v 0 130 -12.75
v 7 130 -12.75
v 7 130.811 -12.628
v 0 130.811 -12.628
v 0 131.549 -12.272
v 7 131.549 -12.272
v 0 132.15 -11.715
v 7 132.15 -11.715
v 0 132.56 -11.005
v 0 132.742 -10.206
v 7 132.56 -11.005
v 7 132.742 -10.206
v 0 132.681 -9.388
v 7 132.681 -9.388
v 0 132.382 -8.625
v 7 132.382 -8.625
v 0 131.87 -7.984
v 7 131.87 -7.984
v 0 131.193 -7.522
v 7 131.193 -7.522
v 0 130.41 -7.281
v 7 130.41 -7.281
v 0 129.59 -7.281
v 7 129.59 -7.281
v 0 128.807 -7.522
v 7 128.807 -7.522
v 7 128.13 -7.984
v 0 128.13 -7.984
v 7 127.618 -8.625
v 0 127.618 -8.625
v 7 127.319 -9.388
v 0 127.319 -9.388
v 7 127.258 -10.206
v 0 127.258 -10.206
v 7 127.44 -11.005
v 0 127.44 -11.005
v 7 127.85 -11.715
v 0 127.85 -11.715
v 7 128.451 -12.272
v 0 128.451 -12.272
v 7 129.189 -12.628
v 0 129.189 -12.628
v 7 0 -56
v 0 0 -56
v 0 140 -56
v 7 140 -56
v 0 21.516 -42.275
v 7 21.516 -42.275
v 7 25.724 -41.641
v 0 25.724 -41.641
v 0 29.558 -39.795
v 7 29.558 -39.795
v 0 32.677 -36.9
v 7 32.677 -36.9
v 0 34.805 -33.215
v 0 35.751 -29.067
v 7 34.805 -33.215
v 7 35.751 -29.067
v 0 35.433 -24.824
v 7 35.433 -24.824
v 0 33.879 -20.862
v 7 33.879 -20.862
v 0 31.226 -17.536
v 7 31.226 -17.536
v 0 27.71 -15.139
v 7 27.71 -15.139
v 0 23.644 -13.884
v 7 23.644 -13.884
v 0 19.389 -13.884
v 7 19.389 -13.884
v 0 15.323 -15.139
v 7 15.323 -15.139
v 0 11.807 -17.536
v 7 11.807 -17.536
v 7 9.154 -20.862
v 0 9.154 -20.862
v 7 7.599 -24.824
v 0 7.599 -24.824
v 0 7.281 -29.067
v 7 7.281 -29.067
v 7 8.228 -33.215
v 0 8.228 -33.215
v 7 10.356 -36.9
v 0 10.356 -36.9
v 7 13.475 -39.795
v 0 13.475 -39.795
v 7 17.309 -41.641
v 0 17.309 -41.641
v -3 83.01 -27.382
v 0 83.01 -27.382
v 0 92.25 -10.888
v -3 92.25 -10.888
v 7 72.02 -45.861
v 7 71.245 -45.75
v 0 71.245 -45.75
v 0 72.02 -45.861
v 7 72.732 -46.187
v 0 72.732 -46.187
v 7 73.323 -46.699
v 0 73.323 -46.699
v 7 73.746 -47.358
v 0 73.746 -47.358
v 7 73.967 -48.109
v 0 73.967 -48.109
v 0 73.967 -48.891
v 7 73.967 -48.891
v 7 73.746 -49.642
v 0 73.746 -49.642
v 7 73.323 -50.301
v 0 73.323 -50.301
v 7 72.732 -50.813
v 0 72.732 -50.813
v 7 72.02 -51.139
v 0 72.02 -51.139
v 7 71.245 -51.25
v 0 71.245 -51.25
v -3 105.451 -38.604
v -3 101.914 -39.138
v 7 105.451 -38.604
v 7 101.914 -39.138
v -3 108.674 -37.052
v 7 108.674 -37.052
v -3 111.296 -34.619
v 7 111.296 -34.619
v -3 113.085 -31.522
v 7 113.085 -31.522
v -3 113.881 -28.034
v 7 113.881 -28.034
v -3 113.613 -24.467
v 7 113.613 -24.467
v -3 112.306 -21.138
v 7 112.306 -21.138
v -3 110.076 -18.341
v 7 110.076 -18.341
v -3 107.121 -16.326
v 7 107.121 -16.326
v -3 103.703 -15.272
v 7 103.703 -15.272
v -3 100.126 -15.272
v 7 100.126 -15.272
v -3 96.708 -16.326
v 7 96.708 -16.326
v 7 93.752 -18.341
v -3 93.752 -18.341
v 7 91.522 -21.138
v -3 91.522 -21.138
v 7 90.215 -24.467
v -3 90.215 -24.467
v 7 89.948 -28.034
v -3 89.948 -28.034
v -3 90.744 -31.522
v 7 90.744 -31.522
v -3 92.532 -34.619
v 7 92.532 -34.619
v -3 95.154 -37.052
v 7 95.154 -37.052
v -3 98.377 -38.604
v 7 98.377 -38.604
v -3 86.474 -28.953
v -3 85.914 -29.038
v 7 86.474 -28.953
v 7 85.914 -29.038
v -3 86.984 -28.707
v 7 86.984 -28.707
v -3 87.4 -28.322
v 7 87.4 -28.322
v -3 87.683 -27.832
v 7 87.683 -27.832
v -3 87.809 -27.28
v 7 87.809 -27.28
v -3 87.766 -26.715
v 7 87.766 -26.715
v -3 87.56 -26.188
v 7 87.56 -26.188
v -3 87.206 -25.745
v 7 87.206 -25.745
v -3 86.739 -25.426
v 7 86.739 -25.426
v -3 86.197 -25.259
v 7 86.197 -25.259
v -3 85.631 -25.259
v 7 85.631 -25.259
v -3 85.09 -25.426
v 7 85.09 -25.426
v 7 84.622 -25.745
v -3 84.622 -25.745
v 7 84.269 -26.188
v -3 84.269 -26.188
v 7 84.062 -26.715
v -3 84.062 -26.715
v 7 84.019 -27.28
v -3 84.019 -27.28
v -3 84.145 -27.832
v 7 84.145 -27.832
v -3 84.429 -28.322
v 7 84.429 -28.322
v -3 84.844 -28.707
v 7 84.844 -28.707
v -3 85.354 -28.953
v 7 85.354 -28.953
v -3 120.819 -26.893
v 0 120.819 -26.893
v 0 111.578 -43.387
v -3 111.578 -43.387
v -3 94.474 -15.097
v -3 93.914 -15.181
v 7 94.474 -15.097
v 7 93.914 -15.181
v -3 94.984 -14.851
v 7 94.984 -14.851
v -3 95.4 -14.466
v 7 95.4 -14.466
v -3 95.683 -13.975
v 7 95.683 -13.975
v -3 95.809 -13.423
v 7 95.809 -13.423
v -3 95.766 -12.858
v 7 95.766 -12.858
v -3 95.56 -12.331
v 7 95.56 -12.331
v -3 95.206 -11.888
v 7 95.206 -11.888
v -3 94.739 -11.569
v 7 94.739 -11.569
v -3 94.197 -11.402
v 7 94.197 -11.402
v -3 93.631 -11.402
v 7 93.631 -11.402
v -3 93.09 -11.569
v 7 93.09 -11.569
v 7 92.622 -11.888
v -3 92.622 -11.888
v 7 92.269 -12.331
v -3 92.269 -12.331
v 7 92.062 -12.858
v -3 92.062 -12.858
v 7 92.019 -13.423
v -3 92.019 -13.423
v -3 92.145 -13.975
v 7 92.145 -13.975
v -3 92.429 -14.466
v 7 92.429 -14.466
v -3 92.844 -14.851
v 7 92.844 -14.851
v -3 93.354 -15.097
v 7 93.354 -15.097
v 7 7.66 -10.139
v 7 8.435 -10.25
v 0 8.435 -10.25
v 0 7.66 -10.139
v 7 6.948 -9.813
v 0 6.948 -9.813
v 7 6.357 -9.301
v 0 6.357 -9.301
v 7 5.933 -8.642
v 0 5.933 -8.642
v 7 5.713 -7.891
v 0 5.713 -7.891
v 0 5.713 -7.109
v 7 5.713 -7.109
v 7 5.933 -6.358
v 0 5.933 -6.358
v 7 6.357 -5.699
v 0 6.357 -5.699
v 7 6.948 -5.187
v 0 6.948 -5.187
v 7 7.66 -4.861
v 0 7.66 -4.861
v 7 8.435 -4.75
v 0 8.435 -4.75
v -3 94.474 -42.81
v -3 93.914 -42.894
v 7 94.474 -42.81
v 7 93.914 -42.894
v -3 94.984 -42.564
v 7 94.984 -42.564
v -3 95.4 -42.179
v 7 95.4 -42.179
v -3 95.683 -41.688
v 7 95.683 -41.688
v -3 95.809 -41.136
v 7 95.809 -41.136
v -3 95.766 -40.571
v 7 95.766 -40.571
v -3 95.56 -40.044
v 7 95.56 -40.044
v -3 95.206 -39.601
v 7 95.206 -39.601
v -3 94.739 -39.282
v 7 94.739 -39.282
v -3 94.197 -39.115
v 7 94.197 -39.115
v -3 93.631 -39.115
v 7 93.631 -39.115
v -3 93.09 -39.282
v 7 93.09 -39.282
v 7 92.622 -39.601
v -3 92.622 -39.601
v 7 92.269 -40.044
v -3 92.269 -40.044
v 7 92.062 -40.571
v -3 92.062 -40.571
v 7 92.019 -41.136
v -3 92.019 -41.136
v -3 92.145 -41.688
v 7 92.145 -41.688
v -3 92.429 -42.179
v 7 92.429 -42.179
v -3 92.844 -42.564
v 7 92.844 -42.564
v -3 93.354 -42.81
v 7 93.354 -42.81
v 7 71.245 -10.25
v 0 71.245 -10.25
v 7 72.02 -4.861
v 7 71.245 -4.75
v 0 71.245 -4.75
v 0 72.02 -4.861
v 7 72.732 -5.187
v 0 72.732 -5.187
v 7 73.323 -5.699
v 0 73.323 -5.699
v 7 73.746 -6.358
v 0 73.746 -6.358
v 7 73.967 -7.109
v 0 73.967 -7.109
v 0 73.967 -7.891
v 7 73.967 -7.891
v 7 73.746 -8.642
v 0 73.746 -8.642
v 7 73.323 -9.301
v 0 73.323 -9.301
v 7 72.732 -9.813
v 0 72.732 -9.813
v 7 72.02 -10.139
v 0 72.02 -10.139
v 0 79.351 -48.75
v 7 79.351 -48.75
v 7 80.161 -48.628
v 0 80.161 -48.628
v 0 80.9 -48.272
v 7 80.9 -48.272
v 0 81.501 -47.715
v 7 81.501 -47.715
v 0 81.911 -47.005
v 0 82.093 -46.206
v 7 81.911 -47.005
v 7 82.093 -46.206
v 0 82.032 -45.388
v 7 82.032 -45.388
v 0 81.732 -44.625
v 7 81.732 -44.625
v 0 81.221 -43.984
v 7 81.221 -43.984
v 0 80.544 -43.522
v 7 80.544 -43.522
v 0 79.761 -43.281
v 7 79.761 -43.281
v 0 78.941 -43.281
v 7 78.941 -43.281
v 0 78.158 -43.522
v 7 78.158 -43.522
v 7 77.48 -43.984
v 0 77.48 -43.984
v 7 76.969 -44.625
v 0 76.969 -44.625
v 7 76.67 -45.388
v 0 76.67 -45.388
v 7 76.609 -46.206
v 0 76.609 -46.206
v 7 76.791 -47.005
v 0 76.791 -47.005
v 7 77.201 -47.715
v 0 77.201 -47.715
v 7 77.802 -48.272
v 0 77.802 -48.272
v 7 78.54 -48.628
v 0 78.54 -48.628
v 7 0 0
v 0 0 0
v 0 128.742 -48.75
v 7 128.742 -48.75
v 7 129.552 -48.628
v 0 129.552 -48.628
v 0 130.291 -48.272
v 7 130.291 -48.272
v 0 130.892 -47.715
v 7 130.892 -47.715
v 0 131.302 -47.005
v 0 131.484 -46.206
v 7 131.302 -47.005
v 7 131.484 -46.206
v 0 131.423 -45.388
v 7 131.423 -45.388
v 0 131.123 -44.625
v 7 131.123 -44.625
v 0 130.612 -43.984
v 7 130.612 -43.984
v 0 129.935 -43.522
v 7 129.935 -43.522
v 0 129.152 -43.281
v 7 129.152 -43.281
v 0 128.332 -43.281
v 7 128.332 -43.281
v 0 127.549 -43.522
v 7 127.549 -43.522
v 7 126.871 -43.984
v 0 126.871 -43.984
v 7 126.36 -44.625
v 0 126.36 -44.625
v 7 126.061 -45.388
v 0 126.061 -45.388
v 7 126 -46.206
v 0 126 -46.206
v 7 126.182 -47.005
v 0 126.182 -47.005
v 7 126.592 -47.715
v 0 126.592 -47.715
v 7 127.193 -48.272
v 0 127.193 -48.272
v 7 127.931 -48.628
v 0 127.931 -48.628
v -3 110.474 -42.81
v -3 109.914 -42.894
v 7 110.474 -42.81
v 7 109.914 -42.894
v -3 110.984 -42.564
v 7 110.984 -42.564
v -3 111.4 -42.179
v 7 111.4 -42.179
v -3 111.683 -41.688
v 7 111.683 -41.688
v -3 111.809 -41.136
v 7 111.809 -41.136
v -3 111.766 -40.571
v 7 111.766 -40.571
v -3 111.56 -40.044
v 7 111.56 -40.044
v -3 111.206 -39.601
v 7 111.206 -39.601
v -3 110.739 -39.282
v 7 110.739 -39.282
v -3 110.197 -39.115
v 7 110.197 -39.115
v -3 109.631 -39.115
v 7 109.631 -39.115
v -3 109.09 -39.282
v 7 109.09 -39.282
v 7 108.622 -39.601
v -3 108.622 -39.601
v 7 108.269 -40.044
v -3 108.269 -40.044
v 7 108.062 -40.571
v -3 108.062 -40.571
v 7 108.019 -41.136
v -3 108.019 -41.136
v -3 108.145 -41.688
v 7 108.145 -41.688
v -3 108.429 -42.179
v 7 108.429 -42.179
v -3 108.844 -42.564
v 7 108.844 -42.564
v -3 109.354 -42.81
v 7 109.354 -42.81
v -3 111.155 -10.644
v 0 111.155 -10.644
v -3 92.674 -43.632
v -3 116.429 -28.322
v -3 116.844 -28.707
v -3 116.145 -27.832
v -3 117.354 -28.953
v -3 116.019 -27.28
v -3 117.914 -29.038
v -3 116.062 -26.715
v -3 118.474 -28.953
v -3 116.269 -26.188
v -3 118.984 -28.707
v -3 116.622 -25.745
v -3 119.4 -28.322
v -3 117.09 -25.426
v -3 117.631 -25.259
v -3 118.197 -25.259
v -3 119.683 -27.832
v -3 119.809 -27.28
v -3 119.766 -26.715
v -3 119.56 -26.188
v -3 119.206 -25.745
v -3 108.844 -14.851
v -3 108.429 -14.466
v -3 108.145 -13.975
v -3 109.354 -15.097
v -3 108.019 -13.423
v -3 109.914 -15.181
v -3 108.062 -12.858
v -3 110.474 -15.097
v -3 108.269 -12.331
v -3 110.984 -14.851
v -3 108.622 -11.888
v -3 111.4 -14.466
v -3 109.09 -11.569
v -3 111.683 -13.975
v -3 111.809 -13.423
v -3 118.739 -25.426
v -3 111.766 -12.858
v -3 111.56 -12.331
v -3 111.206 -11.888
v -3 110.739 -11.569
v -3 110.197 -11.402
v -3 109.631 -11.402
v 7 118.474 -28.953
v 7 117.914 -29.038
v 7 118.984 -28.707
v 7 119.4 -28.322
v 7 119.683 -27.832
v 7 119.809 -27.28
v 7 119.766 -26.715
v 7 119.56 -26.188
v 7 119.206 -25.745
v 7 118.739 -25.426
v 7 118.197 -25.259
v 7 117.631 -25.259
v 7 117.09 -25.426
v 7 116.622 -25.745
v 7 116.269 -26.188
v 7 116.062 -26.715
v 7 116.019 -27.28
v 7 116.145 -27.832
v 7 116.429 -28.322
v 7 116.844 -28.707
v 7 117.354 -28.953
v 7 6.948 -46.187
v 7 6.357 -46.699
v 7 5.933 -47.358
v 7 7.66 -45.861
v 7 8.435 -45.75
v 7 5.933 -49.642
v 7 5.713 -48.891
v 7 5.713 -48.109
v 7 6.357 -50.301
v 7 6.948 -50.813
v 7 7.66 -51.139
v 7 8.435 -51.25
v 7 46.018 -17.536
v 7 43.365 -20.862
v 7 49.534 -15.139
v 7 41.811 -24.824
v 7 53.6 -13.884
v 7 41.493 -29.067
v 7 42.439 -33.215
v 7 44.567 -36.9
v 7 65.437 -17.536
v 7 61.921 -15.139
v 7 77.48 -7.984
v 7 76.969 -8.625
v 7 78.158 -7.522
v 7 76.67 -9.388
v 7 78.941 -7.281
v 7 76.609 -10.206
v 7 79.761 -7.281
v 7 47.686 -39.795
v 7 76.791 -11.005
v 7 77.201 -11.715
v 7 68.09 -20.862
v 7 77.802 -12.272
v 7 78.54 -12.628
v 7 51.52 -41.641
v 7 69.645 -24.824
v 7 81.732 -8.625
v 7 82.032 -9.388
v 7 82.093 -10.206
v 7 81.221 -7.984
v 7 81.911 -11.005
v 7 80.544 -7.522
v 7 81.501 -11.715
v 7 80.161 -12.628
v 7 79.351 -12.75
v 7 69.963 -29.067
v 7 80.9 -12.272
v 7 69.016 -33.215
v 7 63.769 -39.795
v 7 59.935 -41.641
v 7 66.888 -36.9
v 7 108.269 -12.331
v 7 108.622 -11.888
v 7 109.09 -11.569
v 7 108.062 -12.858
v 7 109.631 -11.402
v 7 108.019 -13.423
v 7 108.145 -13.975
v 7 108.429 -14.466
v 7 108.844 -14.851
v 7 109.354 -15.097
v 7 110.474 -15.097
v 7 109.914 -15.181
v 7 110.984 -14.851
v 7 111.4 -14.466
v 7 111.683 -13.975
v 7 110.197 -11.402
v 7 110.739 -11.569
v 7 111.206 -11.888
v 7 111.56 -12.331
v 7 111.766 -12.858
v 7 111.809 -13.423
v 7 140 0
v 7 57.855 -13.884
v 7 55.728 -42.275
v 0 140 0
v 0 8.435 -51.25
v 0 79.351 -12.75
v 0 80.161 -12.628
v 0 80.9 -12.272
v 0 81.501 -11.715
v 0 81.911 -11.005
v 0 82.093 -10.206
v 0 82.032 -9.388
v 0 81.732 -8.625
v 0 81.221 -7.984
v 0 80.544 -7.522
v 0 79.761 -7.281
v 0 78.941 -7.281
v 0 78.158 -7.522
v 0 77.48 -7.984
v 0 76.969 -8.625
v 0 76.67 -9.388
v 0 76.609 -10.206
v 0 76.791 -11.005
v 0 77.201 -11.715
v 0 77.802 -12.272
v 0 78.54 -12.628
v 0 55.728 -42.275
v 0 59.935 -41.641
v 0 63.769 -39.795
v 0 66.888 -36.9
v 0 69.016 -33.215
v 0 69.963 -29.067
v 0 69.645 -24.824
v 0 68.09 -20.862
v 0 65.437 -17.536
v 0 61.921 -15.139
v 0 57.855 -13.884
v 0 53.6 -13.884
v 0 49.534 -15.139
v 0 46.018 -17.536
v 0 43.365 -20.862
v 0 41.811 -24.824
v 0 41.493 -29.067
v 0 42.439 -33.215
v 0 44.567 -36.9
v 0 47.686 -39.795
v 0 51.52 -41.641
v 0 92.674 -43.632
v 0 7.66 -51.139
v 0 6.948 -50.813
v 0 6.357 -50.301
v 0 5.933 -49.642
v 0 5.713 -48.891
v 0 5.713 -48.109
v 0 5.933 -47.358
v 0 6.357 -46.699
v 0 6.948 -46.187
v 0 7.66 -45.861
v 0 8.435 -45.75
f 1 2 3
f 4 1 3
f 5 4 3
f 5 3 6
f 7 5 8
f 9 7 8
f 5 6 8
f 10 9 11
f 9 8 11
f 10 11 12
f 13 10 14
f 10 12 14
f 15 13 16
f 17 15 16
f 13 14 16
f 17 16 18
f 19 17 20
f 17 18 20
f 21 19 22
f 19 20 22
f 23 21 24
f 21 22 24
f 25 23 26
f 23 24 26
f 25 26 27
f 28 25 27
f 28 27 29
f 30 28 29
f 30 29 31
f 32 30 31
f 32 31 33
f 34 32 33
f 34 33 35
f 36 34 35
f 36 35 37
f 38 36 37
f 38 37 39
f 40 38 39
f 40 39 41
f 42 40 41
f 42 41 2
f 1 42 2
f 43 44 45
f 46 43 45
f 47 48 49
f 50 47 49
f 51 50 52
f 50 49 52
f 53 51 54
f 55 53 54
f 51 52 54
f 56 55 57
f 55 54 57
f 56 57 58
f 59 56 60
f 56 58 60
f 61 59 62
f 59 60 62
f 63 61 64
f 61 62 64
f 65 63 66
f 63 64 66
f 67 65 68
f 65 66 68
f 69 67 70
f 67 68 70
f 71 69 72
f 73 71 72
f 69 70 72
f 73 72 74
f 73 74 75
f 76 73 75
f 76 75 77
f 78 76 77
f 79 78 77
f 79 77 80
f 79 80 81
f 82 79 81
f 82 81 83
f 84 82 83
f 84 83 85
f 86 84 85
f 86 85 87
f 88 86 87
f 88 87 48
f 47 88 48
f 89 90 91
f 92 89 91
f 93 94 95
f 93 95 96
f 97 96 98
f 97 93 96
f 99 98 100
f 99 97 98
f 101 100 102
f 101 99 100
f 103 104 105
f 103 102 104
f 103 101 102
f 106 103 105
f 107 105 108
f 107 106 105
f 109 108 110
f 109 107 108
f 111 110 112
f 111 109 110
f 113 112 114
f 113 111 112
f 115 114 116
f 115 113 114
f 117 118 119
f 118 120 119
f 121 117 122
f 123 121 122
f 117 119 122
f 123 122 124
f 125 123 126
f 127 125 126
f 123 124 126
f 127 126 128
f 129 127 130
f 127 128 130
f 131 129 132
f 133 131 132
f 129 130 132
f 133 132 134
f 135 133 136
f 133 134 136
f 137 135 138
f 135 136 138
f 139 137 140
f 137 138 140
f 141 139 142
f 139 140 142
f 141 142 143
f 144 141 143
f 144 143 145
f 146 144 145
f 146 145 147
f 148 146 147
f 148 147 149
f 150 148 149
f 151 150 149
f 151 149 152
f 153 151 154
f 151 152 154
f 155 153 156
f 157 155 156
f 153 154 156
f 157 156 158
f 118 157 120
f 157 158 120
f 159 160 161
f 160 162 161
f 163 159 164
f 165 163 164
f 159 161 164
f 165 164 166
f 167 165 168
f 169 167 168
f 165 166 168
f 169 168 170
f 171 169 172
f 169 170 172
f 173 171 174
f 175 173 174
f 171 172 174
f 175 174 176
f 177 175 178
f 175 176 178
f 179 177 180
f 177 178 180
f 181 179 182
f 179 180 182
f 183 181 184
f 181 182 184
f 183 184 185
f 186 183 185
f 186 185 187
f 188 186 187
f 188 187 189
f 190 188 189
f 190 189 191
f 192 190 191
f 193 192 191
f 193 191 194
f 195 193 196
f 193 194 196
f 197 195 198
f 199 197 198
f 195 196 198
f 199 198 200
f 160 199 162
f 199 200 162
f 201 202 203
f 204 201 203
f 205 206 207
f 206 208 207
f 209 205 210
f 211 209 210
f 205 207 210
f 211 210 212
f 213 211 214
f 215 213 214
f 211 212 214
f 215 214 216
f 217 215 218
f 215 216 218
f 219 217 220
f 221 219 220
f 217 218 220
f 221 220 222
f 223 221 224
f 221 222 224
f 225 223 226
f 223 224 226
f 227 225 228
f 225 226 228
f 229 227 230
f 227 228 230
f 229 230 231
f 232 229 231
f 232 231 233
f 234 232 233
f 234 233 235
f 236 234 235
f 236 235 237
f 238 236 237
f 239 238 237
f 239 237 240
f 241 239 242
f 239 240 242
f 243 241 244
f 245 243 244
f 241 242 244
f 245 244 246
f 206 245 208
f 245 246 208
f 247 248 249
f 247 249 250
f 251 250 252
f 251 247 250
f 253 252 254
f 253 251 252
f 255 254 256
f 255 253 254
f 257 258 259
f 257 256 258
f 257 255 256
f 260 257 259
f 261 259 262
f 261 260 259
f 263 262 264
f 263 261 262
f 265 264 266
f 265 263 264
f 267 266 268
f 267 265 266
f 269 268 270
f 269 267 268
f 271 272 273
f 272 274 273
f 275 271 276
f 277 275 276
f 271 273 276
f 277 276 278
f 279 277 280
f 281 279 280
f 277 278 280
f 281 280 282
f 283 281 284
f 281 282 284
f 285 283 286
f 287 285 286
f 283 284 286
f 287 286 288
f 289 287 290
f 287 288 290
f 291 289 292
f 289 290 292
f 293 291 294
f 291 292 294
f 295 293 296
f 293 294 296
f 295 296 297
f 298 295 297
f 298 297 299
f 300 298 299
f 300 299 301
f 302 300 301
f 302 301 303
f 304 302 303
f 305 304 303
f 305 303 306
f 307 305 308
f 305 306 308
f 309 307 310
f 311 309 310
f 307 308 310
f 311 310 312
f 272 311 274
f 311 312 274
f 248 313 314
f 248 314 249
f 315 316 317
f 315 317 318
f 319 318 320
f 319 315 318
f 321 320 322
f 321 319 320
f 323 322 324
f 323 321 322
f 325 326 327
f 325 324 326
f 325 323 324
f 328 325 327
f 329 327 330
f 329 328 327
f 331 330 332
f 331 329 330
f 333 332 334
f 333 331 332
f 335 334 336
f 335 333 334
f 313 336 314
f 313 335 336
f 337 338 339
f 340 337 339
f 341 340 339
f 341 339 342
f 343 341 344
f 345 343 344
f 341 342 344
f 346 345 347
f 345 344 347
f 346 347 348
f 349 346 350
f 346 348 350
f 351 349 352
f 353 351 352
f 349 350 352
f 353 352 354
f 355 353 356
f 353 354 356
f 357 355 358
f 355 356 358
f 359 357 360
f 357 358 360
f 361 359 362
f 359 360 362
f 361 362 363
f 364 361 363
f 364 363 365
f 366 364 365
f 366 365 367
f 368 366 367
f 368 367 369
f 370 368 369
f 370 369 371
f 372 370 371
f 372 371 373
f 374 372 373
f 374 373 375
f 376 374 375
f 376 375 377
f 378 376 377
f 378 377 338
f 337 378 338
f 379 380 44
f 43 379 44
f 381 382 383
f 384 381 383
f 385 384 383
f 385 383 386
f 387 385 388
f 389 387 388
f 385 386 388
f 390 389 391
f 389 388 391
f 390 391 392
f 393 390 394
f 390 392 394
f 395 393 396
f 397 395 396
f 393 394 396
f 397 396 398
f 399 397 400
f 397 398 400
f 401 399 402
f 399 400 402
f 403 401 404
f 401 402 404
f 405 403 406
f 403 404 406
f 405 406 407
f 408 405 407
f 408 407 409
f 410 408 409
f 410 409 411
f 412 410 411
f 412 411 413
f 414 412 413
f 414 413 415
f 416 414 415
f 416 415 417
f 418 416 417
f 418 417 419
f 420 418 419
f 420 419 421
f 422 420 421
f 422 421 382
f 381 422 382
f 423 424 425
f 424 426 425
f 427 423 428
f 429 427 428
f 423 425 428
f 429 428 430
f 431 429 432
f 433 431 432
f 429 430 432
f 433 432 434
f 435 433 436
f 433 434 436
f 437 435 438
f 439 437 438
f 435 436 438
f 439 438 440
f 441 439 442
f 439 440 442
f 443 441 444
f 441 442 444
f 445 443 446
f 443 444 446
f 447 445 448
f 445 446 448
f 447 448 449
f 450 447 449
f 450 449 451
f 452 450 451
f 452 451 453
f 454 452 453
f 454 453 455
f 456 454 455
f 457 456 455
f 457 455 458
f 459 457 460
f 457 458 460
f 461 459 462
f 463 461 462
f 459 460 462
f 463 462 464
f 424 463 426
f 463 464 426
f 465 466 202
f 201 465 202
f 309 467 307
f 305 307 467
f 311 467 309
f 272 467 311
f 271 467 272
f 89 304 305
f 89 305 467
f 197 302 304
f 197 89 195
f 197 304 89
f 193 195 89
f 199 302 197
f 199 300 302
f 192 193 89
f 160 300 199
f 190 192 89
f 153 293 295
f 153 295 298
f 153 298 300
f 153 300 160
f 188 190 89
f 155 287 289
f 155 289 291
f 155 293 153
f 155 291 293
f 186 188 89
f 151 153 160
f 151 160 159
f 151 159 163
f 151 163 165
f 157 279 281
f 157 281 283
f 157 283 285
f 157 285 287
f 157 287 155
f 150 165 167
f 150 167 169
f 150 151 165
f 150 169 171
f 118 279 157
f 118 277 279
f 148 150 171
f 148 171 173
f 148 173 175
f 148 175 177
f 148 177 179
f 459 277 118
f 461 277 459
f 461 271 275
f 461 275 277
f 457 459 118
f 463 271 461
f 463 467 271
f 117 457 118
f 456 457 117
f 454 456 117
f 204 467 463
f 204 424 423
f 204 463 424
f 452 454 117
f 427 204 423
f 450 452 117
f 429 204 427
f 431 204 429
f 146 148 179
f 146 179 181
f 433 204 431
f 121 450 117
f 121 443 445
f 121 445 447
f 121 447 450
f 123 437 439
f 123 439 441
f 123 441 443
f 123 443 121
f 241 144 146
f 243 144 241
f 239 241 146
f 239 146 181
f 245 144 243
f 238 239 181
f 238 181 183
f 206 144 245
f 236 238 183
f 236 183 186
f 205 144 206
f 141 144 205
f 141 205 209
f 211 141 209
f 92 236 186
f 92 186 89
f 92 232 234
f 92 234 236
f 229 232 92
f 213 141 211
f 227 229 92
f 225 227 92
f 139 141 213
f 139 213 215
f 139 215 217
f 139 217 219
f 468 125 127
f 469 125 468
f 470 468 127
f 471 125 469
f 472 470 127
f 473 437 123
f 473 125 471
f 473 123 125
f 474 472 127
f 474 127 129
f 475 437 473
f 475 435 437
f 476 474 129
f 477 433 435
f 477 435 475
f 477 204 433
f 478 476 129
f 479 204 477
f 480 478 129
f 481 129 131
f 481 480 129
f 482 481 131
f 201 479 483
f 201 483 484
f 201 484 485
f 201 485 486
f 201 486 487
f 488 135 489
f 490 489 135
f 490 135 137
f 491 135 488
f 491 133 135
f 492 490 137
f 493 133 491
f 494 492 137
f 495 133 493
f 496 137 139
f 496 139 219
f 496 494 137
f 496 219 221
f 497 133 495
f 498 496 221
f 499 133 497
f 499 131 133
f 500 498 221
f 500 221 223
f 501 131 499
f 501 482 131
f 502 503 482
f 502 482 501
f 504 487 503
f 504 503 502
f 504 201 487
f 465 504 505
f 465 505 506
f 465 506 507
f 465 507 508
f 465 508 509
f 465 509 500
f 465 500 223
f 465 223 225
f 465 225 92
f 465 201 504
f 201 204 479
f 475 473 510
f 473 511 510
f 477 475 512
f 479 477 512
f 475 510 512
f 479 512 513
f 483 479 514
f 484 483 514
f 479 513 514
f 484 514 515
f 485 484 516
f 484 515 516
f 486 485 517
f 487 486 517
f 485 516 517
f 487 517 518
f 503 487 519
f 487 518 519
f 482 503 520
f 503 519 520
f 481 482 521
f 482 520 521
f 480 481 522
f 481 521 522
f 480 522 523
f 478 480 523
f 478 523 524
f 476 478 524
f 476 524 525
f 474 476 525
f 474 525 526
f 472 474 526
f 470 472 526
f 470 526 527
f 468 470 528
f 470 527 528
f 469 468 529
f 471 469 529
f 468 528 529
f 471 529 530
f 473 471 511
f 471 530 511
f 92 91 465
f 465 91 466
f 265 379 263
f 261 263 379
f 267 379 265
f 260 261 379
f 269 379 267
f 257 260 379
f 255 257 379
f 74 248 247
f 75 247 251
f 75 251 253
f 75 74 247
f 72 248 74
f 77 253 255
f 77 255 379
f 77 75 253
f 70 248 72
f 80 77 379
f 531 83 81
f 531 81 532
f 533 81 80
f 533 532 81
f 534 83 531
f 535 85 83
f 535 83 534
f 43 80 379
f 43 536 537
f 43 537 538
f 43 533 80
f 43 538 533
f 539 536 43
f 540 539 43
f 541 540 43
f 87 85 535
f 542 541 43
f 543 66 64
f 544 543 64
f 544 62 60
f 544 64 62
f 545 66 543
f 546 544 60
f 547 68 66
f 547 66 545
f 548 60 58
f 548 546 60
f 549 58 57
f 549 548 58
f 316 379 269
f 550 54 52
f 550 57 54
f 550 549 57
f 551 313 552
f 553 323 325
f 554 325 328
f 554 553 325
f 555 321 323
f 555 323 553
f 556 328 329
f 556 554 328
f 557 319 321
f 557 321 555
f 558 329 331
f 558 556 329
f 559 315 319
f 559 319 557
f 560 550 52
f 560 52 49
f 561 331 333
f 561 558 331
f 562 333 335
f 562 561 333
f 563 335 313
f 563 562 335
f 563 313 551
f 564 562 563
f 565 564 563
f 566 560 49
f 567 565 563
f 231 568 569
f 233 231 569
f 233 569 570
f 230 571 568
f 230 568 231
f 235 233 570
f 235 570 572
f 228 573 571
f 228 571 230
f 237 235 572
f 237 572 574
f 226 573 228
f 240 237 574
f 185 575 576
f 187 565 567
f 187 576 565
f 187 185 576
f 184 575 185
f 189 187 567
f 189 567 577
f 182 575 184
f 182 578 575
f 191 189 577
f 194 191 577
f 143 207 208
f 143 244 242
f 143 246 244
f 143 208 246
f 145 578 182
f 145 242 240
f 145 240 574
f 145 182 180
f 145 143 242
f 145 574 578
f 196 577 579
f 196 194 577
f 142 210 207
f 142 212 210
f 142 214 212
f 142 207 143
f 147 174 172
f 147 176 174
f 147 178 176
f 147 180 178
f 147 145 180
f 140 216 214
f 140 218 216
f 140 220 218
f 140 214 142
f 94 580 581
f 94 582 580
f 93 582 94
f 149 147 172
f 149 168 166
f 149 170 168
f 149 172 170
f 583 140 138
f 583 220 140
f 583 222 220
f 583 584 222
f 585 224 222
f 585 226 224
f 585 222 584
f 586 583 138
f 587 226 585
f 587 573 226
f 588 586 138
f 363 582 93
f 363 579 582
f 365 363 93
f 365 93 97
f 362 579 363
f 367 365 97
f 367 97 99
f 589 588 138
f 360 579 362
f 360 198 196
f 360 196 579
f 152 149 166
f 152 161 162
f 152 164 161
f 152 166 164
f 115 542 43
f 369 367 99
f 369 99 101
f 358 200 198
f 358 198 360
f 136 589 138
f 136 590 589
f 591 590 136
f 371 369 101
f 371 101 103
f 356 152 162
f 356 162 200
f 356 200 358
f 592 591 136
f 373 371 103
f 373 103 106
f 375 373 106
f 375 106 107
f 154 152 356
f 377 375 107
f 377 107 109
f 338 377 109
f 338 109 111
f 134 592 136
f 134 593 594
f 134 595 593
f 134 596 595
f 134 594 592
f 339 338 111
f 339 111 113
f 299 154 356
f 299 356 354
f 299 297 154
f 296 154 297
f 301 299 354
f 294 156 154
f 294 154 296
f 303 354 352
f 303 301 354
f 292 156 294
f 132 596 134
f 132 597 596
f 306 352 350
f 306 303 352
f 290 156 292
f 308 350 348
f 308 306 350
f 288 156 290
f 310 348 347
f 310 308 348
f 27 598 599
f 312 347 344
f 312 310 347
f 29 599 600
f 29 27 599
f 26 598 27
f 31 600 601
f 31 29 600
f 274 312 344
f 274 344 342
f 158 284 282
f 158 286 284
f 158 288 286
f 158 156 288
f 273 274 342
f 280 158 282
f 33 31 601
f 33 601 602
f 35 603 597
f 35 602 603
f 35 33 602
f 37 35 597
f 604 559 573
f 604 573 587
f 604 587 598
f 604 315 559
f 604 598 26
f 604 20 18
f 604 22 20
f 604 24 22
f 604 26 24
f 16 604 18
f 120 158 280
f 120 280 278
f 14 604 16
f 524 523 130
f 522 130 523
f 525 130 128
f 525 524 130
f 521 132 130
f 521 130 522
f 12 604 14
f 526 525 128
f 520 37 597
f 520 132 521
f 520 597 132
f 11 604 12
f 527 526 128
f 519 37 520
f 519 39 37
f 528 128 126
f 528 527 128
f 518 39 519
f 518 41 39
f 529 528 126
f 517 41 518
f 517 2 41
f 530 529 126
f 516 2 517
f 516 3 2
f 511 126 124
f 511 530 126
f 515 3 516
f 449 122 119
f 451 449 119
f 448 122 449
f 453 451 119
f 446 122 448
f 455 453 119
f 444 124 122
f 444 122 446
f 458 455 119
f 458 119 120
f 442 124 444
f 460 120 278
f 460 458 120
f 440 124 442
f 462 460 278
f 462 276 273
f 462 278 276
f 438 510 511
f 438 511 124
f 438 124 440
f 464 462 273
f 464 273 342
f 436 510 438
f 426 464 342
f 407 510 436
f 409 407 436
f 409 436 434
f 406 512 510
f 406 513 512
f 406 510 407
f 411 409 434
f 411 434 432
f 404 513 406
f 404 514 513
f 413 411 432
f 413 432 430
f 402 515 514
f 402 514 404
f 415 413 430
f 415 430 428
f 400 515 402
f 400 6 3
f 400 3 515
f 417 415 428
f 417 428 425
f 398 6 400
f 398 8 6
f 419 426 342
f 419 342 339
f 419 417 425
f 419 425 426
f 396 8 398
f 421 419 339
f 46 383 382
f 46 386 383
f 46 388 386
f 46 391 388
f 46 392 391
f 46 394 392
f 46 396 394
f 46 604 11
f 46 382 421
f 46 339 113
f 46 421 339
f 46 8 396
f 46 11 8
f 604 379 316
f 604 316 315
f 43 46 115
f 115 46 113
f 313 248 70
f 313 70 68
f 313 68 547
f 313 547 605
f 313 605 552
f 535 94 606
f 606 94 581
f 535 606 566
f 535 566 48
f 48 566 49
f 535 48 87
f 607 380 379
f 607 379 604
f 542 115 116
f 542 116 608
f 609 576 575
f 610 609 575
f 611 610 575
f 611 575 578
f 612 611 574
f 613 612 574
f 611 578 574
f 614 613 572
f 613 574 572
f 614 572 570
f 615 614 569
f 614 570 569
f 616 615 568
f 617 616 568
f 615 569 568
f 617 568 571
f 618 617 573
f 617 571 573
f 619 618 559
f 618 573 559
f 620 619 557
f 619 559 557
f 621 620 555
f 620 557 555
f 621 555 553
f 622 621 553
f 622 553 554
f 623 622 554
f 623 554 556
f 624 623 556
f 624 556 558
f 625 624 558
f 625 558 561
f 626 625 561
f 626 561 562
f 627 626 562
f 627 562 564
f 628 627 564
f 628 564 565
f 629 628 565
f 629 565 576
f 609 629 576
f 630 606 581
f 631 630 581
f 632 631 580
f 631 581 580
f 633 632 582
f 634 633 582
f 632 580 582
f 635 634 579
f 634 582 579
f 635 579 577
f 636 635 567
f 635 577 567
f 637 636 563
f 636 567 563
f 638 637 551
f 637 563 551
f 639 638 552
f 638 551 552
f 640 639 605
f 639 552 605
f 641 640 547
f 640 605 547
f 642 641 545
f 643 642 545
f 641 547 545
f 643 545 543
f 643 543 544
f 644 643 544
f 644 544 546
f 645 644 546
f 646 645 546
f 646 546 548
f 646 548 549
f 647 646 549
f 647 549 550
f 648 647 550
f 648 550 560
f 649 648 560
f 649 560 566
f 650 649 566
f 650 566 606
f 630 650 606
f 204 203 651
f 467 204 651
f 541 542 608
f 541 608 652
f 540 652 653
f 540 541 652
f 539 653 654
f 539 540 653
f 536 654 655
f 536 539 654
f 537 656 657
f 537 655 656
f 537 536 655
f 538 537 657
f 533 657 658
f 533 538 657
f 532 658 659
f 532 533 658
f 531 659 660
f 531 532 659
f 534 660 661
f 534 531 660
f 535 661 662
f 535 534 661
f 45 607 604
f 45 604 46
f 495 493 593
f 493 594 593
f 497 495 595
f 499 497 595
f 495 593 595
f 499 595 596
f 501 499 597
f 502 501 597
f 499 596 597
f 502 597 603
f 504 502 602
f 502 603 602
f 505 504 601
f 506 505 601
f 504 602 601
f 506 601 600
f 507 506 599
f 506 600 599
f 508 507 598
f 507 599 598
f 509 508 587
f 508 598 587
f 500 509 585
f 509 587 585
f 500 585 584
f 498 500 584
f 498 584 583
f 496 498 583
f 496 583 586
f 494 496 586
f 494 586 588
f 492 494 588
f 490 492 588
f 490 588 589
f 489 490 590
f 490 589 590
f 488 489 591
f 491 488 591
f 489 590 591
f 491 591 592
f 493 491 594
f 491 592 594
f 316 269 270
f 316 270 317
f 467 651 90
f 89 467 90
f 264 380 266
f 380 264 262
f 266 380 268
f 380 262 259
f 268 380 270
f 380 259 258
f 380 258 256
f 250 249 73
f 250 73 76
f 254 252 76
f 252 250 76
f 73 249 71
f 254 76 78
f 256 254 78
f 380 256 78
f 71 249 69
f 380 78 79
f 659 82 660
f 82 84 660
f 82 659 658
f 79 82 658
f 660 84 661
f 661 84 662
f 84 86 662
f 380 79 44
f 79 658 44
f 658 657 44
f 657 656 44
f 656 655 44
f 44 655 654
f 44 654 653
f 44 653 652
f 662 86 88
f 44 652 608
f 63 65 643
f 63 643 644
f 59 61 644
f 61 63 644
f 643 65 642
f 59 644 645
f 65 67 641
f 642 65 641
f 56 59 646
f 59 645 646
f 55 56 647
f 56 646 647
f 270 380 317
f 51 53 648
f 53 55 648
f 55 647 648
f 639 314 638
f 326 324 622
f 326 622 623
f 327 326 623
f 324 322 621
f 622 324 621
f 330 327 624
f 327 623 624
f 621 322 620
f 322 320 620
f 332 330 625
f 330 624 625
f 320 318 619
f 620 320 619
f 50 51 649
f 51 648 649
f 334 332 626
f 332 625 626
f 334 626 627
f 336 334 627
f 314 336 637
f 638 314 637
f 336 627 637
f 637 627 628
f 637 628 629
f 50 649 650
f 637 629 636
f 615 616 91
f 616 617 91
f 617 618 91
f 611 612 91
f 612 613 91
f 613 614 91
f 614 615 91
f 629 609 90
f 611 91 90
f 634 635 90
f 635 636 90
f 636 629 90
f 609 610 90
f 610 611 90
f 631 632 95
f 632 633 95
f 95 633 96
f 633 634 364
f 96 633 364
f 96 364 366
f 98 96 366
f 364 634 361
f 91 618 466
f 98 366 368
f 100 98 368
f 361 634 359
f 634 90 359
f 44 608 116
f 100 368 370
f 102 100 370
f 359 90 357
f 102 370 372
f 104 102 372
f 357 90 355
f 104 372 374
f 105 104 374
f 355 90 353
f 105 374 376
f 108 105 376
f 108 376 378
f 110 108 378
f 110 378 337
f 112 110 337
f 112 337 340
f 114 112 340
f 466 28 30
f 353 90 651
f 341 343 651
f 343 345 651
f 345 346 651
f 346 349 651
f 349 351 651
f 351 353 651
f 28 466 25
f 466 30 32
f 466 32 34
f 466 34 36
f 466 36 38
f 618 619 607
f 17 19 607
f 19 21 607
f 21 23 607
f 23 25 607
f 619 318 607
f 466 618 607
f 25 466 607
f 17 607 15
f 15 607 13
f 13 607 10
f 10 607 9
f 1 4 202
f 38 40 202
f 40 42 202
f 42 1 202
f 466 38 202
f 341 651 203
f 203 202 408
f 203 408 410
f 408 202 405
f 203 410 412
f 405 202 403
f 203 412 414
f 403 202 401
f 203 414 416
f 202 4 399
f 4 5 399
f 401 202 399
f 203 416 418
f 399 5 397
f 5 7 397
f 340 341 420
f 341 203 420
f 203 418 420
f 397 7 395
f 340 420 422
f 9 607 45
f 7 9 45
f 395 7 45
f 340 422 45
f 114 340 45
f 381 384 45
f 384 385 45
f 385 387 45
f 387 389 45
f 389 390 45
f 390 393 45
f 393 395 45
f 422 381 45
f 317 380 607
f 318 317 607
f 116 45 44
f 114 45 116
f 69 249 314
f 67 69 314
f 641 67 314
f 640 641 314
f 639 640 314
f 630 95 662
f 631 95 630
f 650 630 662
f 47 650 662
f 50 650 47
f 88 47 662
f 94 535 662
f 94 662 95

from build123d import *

# Parameters (mm, degrees)
SKETCH1_W           = 56
SKETCH1_H           = 140
BOSS_EXTRUDE1_DEPTH = 7
SKETCH2_R           = 14.275
SKETCH2_R_2         = 12
SKETCH2_R_3         = 1.9
CUT_EXTRUDE1_DEPTH  = 8
CUT_EXTRUDE2_DEPTH  = 8
SKETCH4_R           = 2.75
CUT_EXTRUDE3_DEPTH  = 8
BOSS_EXTRUDE3_DEPTH = 3
SKETCH8_R           = 1.9
SKETCH8_R_2         = 12
CUT_EXTRUDE5_DEPTH  = 4


with BuildPart() as part:
    # Sketch1 → Boss-Extrude1 (new body)
    with BuildSketch(Plane(origin=(0, 0, 0), x_dir=(0, 0, -1), z_dir=(1, 0, 0))):
        with Locations((28, 70)):
            Rectangle(SKETCH1_W, SKETCH1_H)
    extrude(amount=BOSS_EXTRUDE1_DEPTH)

    # Sketch2 → Cut-Extrude1 (cut, through all)
    with BuildSketch(Plane(origin=(7, 0, 0), x_dir=(0, 0, -1), z_dir=(1, 0, 0))):
        with Locations((28, 21.516289278)):
            Circle(SKETCH2_R)
        with Locations((28, 55.727598477)):
            Circle(SKETCH2_R)
        with Locations((27.137621846, 101.914121241)):
            Circle(SKETCH2_R_2)
        with Locations((40.994028307, 109.914121241)):
            Circle(SKETCH2_R_3)
        with Locations((27.137621846, 117.914121241)):
            Circle(SKETCH2_R_3)
        with Locations((13.281215386, 109.914121241)):
            Circle(SKETCH2_R_3)
        with Locations((40.994028307, 93.914121241)):
            Circle(SKETCH2_R_3)
        with Locations((27.137621846, 85.914121241)):
            Circle(SKETCH2_R_3)
        with Locations((13.281215386, 93.914121241)):
            Circle(SKETCH2_R_3)
    extrude(amount=-CUT_EXTRUDE1_DEPTH, mode=Mode.SUBTRACT)

    # Sketch3 → Cut-Extrude2 (cut, through all)
    with BuildSketch(Plane(origin=(7, 0, 0), x_dir=(0, 0, -1), z_dir=(1, 0, 0))):
        with BuildLine():
            Line((10.25, 71.244817418), (10.25, 8.434985259))
            ThreePointArc((10.25, 8.434985259), (7.5, 5.684985259), (4.75, 8.434985259))
            Line((4.75, 8.434985259), (4.75, 71.244817418))
            ThreePointArc((4.75, 71.244817418), (7.5, 73.994817418), (10.25, 71.244817418))
        make_face()
        with BuildLine():
            Line((45.75, 8.434985259), (45.75, 71.244817418))
            ThreePointArc((45.75, 71.244817418), (48.5, 73.994817418), (51.25, 71.244817418))
            Line((51.25, 71.244817418), (51.25, 8.434985259))
            ThreePointArc((51.25, 8.434985259), (48.5, 5.684985259), (45.75, 8.434985259))
        make_face()
    extrude(amount=-CUT_EXTRUDE2_DEPTH, mode=Mode.SUBTRACT)

    # Sketch4 → Cut-Extrude3 (cut, through all)
    with BuildSketch(Plane(origin=(7, 0, 0), x_dir=(0, 0, -1), z_dir=(1, 0, 0))):
        with Locations((10, 130)):
            Circle(SKETCH4_R)
        with Locations((46, 128.741828228)):
            Circle(SKETCH4_R)
        with Locations((46, 79.350819397)):
            Circle(SKETCH4_R)
        with Locations((10, 79.350819397)):
            Circle(SKETCH4_R)
    extrude(amount=-CUT_EXTRUDE3_DEPTH, mode=Mode.SUBTRACT)

    # Sketch7 → Boss-Extrude3 (add)
    with BuildSketch(Plane.ZY):
        Polygon((-10.64359884, 111.154642842), (-26.893136794, 120.818624975), (-43.3871598, 111.578103374), (-43.631644852, 92.673599639), (-27.382106898, 83.009617506), (-10.888083892, 92.250139107), align=None)
    extrude(amount=BOSS_EXTRUDE3_DEPTH)

    # Sketch8 → Cut-Extrude5 (cut, through all)
    with BuildSketch(Plane(origin=(0, 0, 0), x_dir=(0, 0, -1), z_dir=(1, 0, 0))):
        with Locations((13.281215386, 109.914121241)):
            Circle(SKETCH8_R)
        with Locations((13.281215386, 93.914121241)):
            Circle(SKETCH8_R)
        with Locations((27.137621846, 85.914121241)):
            Circle(SKETCH8_R)
        with Locations((40.994028307, 93.914121241)):
            Circle(SKETCH8_R)
        with Locations((40.994028307, 109.914121241)):
            Circle(SKETCH8_R)
        with Locations((27.137621846, 117.914121241)):
            Circle(SKETCH8_R)
        with Locations((27.137621846, 101.914121241)):
            Circle(SKETCH8_R_2)
    extrude(amount=-CUT_EXTRUDE5_DEPTH, mode=Mode.SUBTRACT)


solid = part.part
